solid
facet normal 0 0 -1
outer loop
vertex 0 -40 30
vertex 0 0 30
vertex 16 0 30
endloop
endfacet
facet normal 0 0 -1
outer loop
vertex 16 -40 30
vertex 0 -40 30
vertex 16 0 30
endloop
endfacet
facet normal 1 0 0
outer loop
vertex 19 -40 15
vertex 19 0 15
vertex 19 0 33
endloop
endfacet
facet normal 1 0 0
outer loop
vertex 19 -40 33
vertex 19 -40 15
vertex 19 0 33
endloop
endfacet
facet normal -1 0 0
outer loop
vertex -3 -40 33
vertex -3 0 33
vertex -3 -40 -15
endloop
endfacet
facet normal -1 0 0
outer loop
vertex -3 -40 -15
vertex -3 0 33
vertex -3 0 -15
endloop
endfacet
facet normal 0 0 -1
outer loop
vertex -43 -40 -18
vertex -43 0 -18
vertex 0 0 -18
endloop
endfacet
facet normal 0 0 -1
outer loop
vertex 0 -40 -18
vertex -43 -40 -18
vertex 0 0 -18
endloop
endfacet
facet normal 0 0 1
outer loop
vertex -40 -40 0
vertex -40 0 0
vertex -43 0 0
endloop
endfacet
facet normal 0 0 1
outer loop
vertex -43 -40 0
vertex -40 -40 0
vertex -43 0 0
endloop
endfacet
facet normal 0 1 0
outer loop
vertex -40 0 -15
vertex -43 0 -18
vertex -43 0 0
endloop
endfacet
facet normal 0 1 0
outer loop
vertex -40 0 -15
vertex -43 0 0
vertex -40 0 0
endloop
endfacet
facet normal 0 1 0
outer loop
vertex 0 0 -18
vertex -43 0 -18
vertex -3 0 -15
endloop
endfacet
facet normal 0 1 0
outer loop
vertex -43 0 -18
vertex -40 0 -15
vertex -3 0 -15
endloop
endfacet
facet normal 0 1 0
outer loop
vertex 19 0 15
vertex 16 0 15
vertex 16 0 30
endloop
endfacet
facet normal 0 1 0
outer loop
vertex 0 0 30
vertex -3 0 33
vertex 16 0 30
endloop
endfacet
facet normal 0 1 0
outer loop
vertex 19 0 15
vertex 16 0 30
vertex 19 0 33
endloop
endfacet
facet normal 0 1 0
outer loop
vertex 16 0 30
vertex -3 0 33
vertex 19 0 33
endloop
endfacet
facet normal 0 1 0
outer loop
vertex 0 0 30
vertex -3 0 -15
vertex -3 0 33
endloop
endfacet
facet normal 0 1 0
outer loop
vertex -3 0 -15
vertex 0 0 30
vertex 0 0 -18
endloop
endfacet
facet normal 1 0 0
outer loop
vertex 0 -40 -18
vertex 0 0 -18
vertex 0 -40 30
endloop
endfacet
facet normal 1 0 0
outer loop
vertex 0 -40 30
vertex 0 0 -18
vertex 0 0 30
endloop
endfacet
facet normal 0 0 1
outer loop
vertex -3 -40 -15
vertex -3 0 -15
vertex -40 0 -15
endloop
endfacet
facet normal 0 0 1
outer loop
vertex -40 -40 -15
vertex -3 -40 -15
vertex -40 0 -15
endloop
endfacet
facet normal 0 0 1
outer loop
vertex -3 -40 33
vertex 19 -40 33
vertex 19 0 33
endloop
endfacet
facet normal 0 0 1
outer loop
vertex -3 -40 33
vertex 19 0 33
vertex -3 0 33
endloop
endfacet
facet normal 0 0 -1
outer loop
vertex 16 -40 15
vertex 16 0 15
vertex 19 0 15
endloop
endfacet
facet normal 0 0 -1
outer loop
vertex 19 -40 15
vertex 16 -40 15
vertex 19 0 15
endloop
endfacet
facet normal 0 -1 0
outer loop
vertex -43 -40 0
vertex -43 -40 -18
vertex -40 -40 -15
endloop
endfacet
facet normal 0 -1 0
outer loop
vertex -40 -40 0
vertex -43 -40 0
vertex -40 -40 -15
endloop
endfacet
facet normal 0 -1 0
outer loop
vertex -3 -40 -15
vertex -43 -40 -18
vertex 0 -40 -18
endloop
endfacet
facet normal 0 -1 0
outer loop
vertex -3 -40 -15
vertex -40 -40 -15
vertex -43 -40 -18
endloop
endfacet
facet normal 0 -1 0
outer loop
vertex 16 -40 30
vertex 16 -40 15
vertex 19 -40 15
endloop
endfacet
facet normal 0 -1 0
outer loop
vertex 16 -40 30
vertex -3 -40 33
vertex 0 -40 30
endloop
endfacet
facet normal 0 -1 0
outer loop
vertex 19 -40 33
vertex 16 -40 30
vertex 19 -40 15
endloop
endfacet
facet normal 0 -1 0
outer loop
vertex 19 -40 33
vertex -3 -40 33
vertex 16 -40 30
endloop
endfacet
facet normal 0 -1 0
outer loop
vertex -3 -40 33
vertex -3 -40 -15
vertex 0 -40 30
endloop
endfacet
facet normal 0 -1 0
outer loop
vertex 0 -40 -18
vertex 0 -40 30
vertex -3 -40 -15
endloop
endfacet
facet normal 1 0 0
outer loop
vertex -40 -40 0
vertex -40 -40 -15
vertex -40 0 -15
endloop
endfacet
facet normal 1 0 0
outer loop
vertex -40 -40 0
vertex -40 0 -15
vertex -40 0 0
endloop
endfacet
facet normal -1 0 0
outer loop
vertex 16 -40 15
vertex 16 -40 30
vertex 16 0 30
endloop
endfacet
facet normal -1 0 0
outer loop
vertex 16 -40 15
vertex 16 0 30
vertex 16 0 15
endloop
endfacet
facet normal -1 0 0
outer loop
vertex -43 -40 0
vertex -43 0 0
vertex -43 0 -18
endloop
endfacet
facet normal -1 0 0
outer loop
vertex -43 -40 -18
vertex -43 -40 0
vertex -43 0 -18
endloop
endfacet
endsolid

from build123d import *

# Parameters (mm, degrees)
F1_DEPTH = 40


with BuildPart() as f1:
    # F0 (on Front) → F1 (new body)
    with BuildSketch(Plane.XZ):
        Polygon((0, 30), (16, 30), (16, 15), (19, 15), (19, 30), (19, 33), (0, 33), (-3, 33), (-3, 30), (-3, -15), (-40, -15), (-40, 0), (-43, 0), (-43, -18), (-40, -18), (0, -18), (0, -15), align=None)
    extrude(amount=F1_DEPTH)


solid = f1.part
